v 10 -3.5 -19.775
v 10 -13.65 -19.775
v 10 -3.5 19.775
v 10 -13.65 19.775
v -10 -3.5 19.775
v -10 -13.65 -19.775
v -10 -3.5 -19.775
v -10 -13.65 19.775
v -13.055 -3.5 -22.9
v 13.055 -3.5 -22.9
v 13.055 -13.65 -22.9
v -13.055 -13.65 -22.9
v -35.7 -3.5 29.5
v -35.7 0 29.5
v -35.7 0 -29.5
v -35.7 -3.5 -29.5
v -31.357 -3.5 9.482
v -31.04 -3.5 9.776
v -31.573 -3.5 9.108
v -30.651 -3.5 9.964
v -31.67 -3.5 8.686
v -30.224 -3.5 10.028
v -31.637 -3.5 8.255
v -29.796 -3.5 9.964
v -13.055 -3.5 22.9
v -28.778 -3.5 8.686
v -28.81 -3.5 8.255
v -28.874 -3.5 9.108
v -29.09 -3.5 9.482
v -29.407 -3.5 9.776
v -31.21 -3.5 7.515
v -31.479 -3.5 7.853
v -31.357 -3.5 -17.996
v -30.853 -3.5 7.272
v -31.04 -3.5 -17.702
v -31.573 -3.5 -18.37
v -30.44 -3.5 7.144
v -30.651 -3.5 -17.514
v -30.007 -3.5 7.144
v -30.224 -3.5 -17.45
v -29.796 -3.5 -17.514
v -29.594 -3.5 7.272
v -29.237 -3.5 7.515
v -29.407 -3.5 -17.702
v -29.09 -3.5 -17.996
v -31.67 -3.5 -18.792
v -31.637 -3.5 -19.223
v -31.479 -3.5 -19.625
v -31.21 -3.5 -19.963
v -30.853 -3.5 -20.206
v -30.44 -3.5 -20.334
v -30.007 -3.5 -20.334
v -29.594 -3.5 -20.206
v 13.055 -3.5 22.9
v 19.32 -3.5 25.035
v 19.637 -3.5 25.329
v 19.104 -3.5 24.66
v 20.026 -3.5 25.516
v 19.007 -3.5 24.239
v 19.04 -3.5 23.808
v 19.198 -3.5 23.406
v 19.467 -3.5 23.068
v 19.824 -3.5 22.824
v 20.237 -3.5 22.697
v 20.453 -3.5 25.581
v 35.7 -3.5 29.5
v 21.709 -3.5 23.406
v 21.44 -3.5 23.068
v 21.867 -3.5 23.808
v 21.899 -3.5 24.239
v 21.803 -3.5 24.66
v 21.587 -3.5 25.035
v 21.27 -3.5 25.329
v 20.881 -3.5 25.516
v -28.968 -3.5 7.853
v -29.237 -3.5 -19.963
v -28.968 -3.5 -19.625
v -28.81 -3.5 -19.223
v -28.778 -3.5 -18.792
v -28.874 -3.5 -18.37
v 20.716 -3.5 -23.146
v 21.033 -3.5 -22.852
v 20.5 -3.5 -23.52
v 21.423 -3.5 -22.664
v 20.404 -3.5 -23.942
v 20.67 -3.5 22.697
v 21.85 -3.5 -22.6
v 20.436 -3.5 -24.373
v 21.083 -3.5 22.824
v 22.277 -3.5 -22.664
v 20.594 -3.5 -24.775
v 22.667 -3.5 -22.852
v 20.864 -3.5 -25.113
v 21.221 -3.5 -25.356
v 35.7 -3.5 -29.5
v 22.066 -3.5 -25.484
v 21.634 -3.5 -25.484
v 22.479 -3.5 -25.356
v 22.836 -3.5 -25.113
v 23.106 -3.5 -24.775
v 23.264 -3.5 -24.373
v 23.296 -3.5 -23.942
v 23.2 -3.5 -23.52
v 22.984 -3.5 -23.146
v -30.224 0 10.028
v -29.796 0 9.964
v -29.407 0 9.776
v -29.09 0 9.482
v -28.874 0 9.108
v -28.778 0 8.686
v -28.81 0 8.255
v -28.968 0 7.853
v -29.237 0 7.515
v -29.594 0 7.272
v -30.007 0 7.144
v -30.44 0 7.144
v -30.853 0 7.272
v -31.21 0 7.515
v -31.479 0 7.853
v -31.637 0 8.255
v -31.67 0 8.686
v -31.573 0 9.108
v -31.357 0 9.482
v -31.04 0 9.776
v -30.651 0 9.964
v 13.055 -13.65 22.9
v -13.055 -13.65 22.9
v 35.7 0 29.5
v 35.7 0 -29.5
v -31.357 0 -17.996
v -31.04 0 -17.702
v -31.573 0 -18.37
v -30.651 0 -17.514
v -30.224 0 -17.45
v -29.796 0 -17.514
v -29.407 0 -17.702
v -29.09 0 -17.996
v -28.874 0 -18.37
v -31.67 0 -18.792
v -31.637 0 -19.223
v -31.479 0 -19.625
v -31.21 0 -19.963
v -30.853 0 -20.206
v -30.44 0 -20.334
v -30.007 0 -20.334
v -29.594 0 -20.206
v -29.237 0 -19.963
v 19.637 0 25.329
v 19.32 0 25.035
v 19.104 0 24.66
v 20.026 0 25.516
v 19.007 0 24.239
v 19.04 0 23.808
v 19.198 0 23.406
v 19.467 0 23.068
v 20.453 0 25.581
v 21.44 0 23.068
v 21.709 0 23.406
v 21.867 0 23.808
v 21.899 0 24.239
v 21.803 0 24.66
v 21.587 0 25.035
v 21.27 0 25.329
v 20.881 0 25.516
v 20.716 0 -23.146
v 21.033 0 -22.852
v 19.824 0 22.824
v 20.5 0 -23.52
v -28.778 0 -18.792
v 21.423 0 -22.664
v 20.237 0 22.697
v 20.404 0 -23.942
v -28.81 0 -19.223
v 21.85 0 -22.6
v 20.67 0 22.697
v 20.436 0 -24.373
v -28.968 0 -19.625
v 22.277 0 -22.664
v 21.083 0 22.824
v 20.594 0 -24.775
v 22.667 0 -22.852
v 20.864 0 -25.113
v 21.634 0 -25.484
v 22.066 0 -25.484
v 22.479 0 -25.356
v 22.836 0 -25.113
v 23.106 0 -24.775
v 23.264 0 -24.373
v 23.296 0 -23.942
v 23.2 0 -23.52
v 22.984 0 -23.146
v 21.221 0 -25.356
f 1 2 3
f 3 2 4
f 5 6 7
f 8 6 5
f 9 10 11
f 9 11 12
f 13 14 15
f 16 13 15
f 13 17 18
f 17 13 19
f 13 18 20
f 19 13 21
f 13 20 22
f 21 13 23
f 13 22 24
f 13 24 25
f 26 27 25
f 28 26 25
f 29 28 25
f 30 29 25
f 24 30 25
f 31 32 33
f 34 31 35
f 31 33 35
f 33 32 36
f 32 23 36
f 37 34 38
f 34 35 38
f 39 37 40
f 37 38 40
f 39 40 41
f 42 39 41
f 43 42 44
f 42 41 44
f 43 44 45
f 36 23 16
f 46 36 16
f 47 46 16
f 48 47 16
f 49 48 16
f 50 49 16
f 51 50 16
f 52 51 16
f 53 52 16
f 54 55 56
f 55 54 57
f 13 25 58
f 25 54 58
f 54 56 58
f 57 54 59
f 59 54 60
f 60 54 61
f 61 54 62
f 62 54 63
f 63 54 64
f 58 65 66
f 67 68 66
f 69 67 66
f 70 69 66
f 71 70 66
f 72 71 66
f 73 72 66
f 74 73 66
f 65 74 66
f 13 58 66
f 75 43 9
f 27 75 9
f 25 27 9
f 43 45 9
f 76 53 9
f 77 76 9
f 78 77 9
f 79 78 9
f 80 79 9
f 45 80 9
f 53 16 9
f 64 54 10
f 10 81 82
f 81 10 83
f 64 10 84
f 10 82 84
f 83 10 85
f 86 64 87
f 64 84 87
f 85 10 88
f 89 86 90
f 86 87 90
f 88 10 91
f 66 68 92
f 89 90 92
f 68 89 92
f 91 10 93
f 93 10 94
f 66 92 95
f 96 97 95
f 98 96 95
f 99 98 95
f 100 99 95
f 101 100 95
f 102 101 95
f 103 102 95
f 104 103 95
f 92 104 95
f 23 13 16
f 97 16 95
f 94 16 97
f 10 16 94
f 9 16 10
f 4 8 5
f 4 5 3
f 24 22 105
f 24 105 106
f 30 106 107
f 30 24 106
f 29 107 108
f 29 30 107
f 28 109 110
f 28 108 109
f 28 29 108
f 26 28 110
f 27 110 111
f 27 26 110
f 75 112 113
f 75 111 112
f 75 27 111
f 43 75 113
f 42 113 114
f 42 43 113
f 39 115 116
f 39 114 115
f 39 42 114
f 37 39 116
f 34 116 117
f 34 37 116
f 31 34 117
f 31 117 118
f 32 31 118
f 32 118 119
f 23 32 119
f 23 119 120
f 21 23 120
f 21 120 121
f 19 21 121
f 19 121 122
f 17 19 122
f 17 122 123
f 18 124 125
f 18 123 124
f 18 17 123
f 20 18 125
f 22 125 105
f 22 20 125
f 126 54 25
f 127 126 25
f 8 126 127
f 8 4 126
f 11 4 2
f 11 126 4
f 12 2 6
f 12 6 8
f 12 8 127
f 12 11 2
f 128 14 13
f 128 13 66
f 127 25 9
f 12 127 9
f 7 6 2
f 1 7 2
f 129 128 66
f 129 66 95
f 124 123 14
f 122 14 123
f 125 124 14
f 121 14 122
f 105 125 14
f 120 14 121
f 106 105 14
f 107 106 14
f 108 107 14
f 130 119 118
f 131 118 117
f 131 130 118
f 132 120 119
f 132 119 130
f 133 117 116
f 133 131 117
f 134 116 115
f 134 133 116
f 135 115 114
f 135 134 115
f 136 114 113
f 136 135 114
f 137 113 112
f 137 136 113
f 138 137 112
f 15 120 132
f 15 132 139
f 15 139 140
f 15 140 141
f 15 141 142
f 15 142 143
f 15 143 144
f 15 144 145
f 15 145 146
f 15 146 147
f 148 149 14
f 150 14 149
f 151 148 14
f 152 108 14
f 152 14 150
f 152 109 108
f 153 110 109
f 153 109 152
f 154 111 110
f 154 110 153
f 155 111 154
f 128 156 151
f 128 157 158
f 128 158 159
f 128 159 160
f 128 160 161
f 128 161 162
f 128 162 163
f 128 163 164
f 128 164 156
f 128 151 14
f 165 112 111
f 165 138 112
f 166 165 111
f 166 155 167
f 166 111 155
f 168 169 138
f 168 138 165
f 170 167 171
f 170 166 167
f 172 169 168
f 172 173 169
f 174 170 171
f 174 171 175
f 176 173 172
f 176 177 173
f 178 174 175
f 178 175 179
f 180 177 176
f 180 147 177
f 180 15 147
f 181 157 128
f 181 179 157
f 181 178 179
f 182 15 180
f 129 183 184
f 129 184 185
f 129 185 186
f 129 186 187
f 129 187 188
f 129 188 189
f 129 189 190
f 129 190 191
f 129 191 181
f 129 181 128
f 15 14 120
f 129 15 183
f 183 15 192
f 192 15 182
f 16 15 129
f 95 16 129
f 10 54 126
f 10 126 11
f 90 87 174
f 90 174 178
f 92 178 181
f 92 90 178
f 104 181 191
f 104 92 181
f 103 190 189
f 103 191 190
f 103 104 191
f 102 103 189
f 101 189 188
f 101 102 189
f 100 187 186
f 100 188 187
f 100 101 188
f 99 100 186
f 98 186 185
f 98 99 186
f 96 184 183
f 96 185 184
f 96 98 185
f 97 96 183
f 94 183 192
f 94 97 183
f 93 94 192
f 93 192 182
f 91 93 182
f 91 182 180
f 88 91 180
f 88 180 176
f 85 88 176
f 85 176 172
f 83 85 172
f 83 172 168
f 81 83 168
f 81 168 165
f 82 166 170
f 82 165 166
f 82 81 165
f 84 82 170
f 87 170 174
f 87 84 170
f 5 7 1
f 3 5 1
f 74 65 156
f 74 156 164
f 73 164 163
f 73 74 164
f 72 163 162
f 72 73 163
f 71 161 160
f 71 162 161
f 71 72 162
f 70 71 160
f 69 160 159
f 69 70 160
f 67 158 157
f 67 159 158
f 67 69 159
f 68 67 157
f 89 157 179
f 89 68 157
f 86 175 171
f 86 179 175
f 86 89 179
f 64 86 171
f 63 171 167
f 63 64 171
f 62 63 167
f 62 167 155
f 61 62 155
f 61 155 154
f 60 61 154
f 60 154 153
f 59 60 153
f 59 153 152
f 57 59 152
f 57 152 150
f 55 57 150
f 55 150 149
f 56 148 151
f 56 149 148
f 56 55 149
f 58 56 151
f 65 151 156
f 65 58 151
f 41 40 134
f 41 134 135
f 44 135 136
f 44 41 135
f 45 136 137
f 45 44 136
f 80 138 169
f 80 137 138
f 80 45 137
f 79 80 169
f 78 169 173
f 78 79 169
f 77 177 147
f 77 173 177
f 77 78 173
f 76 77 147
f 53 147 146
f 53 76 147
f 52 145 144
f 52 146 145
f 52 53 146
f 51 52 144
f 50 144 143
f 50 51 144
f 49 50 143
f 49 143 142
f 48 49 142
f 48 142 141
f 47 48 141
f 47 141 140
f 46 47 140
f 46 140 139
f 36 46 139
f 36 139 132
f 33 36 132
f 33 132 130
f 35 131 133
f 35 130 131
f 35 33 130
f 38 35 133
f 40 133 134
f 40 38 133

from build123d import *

# Parameters (mm, degrees)
SKETCH_1_W               = 71.4
SKETCH_1_H               = 59
EXTRUDE_1_DEPTH          = 3.5
CUT_EXTRUDE_4_DEPTH      = 8.5
CUT_EXTRUDE_4_DEPTH_BACK = 15
SKETCH_2_R               = 1.45
SKETCH_5_W               = 26.11
SKETCH_5_H               = 45.8
EXTRUDE_2_DEPTH          = 10.15
SKETCH_6_W               = 20
SKETCH_6_H               = 39.55
CUT_EXTRUDE_5_DEPTH      = 10.15


with BuildPart() as part:
    # 草圖1 → 填料-伸長1 (new body)
    with BuildSketch(Plane(origin=(0, 0, 0), x_dir=(1, 0, 0), z_dir=(0, 1, 0))):
        Rectangle(SKETCH_1_W, SKETCH_1_H)
    extrude(amount=-EXTRUDE_1_DEPTH)

    # 草圖2 → 除料-伸長4 (cut, two sides: drawn at the far end of the back side and taken through both)
    with BuildSketch(Plane(origin=(0, 0, 0), x_dir=(1, 0, 0), z_dir=(0, 1, 0)).offset(-CUT_EXTRUDE_4_DEPTH_BACK)):
        with Locations(Location((20.453418067, -24.130543915, 0), (0, 0, 270))):
            Circle(SKETCH_2_R)
        with Locations(Location((-30.223577589, 18.9, 0), (0, 0, 270))):
            Circle(SKETCH_2_R)
        with Locations(Location((-30.223577589, -8.577967438, 0), (0, 0, 270))):
            Circle(SKETCH_2_R)
        with Locations(Location((21.85, 24.05, 0), (0, 0, 270))):
            Circle(SKETCH_2_R)
    extrude(amount=CUT_EXTRUDE_4_DEPTH + CUT_EXTRUDE_4_DEPTH_BACK, mode=Mode.SUBTRACT)

    # 草圖5 → 填料-伸長2 (add)
    with BuildSketch(Plane(origin=(0, -3.5, 0), x_dir=(-1, 0, 0), z_dir=(0, -1, 0))):
        Rectangle(SKETCH_5_W, SKETCH_5_H)
    extrude(amount=EXTRUDE_2_DEPTH)

    # 草圖6 → 除料-伸長5 (cut)
    with BuildSketch(Plane.XZ.offset(13.65)):
        Rectangle(SKETCH_6_W, SKETCH_6_H)
    extrude(amount=-CUT_EXTRUDE_5_DEPTH, mode=Mode.SUBTRACT)


solid = part.part
